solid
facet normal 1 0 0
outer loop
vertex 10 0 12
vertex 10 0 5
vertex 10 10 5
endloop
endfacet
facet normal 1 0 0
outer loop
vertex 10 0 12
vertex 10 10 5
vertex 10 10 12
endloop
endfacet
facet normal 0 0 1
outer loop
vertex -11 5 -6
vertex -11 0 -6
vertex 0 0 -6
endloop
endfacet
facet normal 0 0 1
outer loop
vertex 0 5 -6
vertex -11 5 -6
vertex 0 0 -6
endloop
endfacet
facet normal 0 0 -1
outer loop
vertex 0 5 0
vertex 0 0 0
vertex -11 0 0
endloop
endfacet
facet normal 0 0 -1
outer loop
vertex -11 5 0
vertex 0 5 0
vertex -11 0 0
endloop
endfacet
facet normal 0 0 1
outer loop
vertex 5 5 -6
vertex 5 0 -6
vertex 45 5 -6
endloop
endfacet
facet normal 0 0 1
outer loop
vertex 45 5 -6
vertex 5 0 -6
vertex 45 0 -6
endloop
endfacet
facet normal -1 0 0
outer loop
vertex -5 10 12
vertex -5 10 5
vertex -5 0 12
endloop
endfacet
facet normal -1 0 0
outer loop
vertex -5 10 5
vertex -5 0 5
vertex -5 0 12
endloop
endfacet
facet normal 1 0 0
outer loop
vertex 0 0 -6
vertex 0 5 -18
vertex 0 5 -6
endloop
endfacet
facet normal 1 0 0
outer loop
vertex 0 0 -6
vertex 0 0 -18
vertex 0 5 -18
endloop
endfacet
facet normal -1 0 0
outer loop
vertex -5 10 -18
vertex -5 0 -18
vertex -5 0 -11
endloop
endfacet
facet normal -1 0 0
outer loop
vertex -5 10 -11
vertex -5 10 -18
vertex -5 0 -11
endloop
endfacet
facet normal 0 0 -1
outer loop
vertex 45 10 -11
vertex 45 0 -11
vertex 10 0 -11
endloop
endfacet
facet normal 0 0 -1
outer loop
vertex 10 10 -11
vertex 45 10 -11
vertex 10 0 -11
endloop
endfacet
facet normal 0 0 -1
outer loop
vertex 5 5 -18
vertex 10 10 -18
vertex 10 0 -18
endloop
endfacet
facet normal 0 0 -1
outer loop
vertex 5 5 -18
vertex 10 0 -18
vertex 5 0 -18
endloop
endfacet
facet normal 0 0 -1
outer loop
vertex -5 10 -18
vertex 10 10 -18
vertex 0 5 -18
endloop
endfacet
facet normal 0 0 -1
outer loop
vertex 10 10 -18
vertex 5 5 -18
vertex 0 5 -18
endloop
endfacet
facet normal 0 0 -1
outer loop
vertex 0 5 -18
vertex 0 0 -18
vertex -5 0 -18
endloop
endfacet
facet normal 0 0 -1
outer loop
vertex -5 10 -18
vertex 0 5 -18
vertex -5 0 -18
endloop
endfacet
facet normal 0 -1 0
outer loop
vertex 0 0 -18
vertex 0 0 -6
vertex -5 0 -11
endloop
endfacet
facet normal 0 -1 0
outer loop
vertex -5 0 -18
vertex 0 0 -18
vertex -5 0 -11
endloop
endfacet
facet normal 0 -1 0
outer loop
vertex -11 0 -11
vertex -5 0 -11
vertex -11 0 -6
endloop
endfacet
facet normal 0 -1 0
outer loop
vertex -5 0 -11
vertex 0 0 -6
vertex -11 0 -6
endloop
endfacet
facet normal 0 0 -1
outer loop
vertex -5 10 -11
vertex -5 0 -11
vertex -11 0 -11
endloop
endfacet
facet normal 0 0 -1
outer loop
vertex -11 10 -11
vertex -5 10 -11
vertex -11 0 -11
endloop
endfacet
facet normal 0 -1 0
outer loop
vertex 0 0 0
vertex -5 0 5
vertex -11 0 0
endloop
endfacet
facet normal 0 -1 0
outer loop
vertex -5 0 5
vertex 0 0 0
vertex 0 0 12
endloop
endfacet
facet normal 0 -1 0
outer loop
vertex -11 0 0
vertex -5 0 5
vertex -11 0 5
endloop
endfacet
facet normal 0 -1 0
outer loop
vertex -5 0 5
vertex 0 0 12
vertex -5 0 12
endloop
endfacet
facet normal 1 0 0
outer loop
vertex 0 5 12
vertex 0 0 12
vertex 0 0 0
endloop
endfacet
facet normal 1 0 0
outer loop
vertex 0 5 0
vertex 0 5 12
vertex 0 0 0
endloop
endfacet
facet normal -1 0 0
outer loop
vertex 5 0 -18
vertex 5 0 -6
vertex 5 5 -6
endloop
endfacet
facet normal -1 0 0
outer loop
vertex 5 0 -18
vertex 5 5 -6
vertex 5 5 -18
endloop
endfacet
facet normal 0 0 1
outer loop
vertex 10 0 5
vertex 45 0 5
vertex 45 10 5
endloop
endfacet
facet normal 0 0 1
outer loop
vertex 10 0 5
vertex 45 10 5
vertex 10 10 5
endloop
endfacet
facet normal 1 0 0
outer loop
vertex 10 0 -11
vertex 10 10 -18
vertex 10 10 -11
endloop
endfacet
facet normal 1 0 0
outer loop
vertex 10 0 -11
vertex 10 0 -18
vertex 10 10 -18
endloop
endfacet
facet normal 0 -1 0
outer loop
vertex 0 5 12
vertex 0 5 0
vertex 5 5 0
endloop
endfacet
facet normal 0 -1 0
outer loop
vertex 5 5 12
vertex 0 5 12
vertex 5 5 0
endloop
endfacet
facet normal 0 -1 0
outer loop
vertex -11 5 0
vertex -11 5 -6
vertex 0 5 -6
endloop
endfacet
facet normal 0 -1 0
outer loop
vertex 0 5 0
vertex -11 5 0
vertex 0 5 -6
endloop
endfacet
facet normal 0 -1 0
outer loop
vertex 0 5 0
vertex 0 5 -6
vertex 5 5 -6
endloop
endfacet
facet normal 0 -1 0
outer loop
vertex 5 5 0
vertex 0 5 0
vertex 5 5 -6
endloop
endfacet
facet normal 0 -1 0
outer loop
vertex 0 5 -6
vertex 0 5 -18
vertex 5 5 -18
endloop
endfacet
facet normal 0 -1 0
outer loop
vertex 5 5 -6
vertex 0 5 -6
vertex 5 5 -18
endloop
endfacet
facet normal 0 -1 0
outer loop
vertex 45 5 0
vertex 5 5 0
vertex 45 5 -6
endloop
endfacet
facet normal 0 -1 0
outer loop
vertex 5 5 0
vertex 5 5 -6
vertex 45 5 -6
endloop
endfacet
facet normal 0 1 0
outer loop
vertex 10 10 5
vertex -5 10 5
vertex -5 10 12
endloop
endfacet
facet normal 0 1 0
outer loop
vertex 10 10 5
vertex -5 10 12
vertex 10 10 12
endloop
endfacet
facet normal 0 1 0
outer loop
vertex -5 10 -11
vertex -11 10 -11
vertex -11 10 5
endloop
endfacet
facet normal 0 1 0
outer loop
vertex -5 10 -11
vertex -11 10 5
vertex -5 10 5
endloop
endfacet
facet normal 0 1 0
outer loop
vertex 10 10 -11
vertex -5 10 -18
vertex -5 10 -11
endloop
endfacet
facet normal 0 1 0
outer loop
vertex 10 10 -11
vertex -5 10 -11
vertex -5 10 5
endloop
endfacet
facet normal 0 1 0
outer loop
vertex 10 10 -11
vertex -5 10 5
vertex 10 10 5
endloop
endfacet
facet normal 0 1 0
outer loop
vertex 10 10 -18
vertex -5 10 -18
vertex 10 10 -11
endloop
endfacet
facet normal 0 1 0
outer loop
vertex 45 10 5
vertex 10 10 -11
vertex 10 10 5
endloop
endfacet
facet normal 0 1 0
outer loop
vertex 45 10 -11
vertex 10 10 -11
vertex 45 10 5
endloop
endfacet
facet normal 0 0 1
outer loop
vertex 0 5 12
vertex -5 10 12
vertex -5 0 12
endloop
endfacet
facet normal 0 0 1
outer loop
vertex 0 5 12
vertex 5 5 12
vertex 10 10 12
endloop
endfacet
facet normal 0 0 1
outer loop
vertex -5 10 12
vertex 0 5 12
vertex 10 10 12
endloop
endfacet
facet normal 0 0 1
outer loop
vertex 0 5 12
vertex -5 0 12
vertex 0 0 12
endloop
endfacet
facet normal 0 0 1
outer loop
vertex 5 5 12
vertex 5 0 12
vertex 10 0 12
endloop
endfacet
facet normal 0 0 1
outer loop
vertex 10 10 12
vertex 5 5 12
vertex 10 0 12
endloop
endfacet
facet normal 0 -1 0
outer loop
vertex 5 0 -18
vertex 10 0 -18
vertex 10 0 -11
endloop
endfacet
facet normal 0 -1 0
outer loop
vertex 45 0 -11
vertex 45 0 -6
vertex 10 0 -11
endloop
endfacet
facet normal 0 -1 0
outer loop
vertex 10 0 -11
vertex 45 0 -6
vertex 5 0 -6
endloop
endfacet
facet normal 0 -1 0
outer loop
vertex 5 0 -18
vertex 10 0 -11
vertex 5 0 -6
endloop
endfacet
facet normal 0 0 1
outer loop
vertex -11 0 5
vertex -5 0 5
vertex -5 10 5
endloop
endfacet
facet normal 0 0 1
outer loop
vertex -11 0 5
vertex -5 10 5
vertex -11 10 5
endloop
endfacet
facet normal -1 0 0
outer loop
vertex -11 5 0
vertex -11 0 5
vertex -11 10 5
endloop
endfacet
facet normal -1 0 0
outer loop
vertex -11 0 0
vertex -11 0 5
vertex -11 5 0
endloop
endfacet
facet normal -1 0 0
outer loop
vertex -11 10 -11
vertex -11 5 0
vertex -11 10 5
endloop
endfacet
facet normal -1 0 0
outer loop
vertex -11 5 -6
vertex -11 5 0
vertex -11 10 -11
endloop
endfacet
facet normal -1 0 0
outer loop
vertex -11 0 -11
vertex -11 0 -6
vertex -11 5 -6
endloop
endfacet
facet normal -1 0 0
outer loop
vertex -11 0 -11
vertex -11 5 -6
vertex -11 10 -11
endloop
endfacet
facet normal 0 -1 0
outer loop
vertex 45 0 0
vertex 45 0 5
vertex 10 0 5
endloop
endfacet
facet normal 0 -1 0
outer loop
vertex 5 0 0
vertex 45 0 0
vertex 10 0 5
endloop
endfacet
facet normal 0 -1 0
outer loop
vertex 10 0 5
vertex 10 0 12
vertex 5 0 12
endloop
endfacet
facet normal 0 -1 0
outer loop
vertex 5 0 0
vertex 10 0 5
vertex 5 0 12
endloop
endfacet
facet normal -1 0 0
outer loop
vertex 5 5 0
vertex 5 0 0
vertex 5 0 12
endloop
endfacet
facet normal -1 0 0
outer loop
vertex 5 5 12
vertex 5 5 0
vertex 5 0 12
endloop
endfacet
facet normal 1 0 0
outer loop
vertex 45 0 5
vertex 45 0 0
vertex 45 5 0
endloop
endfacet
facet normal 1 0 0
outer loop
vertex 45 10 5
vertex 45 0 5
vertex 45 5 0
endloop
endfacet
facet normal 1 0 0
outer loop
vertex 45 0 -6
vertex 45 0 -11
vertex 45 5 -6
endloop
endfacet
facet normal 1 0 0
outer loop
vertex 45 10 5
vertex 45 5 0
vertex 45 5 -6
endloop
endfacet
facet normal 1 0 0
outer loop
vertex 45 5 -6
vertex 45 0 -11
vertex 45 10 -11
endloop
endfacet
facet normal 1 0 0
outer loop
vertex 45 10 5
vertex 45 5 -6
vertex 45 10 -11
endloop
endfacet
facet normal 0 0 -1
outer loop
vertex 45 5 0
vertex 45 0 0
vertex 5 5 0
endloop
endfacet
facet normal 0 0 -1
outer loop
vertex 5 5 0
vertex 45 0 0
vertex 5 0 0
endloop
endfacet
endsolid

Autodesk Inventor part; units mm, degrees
ref_plane "YZ Plane" through (0, 0, 0) normal (1, 0, 0) x (0, 1, 0)
ref_plane "XZ Plane" through (0, 0, 0) normal (0, 1, 0) x (-1, 0, 0)
ref_plane "XY Plane" through (0, 0, 0) normal (0, 0, 1) x (1, 0, 0)
sketch "Sketch1" plane through (0, 0, 0) normal (0, 1, 0) x (-1, 0, 0)
  line L0 (0, 0) -> (11, 0)
  line L1 (11, 0) -> (11, -6)
  line L2 (11, -6) -> (0, -6)
  line L3 (0, -6) -> (0, 0)
  line L4 (0, 0) -> (-5, 0)
  line L5 (-5, 0) -> (-5, 12)
  line L6 (-5, 12) -> (0, 12)
  line L7 (0, 12) -> (0, 0)
  line L8 (0, -6) -> (-5, -6)
  line L9 (-5, -6) -> (-5, -18)
  line L10 (-5, -18) -> (0, -18)
  line L11 (0, -18) -> (0, -6)
  line L12 (-5, -6) -> (-45, -6)
  line L13 (-45, -6) -> (-45, 0)
  line L14 (-45, 0) -> (-5, 0)
  line L15 (-5, 0) -> (-5, -6)
  line L16 (-5, -6) -> (-45, -6)
  line L17 (-45, -6) -> (-45, -11)
  line L18 (-45, -11) -> (-5, -11)
  line L19 (-5, -11) -> (-5, -6)
  line L20 (-5, 0) -> (-45, 0)
  line L21 (-45, 0) -> (-45, 5)
  line L22 (-45, 5) -> (-5, 5)
  line L23 (-5, 5) -> (-5, 0)
  line L24 (-5, 0) -> (-10, 0)
  line L25 (-10, 0) -> (-10, 12)
  line L26 (-10, 12) -> (-5, 12)
  line L27 (-5, 12) -> (-5, 0)
  line L28 (0, 0) -> (5, 0)
  line L29 (5, 0) -> (5, 12)
  line L30 (5, 12) -> (0, 12)
  line L31 (0, 12) -> (0, 0)
  line L32 (0, -6) -> (5, -6)
  line L33 (5, -6) -> (5, -18)
  line L34 (5, -18) -> (0, -18)
  line L35 (0, -18) -> (0, -6)
  line L36 (-5, -18) -> (-10, -18)
  line L37 (-10, -18) -> (-10, -6)
  line L38 (-10, -6) -> (-5, -6)
  line L39 (-5, -6) -> (-5, -18)
  line L40 (11, 0) -> (5, 0)
  line L41 (5, 0) -> (5, 5)
  line L42 (5, 5) -> (11, 5)
  line L43 (11, 5) -> (11, 0)
  line L44 (11, -6) -> (5, -6)
  line L45 (5, -6) -> (5, -11)
  line L46 (5, -11) -> (11, -11)
  line L47 (11, -11) -> (11, -6)
  point P0 (-10, -11)
  point P1 (-10, 5)
  dimension "d0" = 11
  dimension "d1" = 6
  dimension "d2" = 5
  dimension "d3" = 12
  dimension "d4" = 5
  dimension "d5" = 12
  dimension "d6" = 40
  dimension "d7" = 5
  dimension "d8" = 5
  dimension "d9" = 5
  dimension "d10" = 5
  dimension "d11" = 5
  dimension "d12" = 5
extrude "Extrusion1" add sketch "Sketch1" along normal blind 5 contours L7 L30 L29 L0 | L29 L42 L43 L0 | L2 L33 L34 L11 | L14 L25 L22 L5 | L2 L47 L46 L33 | L9 L18 L37 L12 | L22 L25 L26 L5 | L14 L21 L22 L25 | L9 L36 L37 L18 | L37 L18 L17 L12
sketch "Sketch2" plane through (0, 5, 0) normal (0, 1, 0) x (1, 0, 0)
  line L0 (-11, 6) -> (0, 6) projected
  line L1 (0, 6) -> (0, 18) projected
  line L2 (0, 18) -> (-5, 18) projected
  line L3 (-5, 18) -> (-5, 11) projected
  line L4 (-5, 11) -> (-11, 11) projected
  line L5 (-11, 11) -> (-11, 6) projected
  line L6 (5, 6) -> (45, 6) projected
  line L7 (45, 6) -> (45, 11) projected
  line L8 (45, 11) -> (10, 11) projected
  line L9 (10, 11) -> (10, 18) projected
  line L10 (10, 18) -> (5, 18) projected
  line L11 (5, 18) -> (5, 6) projected
  line L12 (10, -12) -> (10, -5) projected
  line L13 (10, -5) -> (45, -5) projected
  line L14 (45, -5) -> (45, 0) projected
  line L15 (45, 0) -> (5, 0) projected
  line L16 (5, 0) -> (5, -12) projected
  line L17 (5, -12) -> (10, -12) projected
  line L18 (-11, -5) -> (-5, -5) projected
  line L19 (-5, -5) -> (-5, -12) projected
  line L20 (-5, -12) -> (0, -12) projected
  line L21 (0, -12) -> (0, 0) projected
  line L22 (0, 0) -> (-11, 0) projected
  line L23 (-11, 0) -> (-11, -5) projected
  line L24 (-11, 11) -> (10, 11)
  line L25 (10, 11) -> (10, -5)
  line L26 (10, -5) -> (-11, -5)
  line L27 (-11, -5) -> (-11, 11)
  line L28 (-5, 18) -> (10, 18)
  line L29 (10, 18) -> (10, 11)
  line L30 (10, 11) -> (-5, 11)
  line L31 (-5, 11) -> (-5, 18)
  line L32 (-5, -5) -> (10, -5)
  line L33 (10, -5) -> (10, -12)
  line L34 (10, -12) -> (-5, -12)
  line L35 (-5, -12) -> (-5, -5)
extrude "Extrusion2" add sketch "Sketch2" along normal blind 5 contours L5 L4 L24 L1 L0 | L0 L1 L24 L11 L6 L25 L15 L16 L26 L21 L22 L27 | L22 L21 L26 L18 L23 | L24 L3 L2 L1 | L1 L28 L11 L24 | L24 L25 L6 L11 | L11 L10 L9 L24 | L26 L16 L34 L21 | L21 L20 L19 L26 | L26 L12 L17 L16 | L16 L15 L25 L26
sketch "Sketch3" plane through (0, 5, 0) normal (0, 1, 0) x (1, 0, 0)
  point P0 (0, 0)
sketch "Sketch4" plane through (0, 5, 0) normal (0, 1, 0) x (1, 0, 0)
  line L0 (10, 0) -> (10, -5) projected
  line L1 (10, -5) -> (45, -5) projected
  line L2 (45, -5) -> (45, 0) projected
  line L3 (45, 0) -> (10, 0) projected
  line L4 (10, 11) -> (10, 6) projected
  line L5 (10, 6) -> (45, 6) projected
  line L6 (45, 6) -> (45, 11) projected
  line L7 (45, 11) -> (10, 11) projected
  point P0 (0, 0)
extrude "Extrusion3" add sketch "Sketch4" along normal blind 5
sketch "Sketch5" plane through (5, 0, -6) normal (0, 0, 1) x (1, 0, 0)
  line L0 (40, 0) -> (40, 10) projected
  line L1 (40, 0) -> (40, 10) projected
  line L2 (0, 0) -> (40, 0) projected
  line L3 (40, 0) -> (40, 10) projected
  line L4 (5, 10) -> (40, 10) projected
  line L5 (5, 5) -> (5, 10) projected
  line L6 (0, 5) -> (5, 5) projected
  line L7 (0, 0) -> (0, 5) projected
  line L8 (40, 10) -> (5, 10)
  line L9 (5, 10) -> (5, 5)
  line L10 (5, 5) -> (40, 5)
  line L11 (40, 5) -> (40, 10)
  point P0 (-5, 0)
  dimension "d19" = 5
extrude "Extrusion4" add sketch "Sketch5" along normal up to surface (6 mm away) contours L10 L5 L4 L0
properties part number "BTArm"
